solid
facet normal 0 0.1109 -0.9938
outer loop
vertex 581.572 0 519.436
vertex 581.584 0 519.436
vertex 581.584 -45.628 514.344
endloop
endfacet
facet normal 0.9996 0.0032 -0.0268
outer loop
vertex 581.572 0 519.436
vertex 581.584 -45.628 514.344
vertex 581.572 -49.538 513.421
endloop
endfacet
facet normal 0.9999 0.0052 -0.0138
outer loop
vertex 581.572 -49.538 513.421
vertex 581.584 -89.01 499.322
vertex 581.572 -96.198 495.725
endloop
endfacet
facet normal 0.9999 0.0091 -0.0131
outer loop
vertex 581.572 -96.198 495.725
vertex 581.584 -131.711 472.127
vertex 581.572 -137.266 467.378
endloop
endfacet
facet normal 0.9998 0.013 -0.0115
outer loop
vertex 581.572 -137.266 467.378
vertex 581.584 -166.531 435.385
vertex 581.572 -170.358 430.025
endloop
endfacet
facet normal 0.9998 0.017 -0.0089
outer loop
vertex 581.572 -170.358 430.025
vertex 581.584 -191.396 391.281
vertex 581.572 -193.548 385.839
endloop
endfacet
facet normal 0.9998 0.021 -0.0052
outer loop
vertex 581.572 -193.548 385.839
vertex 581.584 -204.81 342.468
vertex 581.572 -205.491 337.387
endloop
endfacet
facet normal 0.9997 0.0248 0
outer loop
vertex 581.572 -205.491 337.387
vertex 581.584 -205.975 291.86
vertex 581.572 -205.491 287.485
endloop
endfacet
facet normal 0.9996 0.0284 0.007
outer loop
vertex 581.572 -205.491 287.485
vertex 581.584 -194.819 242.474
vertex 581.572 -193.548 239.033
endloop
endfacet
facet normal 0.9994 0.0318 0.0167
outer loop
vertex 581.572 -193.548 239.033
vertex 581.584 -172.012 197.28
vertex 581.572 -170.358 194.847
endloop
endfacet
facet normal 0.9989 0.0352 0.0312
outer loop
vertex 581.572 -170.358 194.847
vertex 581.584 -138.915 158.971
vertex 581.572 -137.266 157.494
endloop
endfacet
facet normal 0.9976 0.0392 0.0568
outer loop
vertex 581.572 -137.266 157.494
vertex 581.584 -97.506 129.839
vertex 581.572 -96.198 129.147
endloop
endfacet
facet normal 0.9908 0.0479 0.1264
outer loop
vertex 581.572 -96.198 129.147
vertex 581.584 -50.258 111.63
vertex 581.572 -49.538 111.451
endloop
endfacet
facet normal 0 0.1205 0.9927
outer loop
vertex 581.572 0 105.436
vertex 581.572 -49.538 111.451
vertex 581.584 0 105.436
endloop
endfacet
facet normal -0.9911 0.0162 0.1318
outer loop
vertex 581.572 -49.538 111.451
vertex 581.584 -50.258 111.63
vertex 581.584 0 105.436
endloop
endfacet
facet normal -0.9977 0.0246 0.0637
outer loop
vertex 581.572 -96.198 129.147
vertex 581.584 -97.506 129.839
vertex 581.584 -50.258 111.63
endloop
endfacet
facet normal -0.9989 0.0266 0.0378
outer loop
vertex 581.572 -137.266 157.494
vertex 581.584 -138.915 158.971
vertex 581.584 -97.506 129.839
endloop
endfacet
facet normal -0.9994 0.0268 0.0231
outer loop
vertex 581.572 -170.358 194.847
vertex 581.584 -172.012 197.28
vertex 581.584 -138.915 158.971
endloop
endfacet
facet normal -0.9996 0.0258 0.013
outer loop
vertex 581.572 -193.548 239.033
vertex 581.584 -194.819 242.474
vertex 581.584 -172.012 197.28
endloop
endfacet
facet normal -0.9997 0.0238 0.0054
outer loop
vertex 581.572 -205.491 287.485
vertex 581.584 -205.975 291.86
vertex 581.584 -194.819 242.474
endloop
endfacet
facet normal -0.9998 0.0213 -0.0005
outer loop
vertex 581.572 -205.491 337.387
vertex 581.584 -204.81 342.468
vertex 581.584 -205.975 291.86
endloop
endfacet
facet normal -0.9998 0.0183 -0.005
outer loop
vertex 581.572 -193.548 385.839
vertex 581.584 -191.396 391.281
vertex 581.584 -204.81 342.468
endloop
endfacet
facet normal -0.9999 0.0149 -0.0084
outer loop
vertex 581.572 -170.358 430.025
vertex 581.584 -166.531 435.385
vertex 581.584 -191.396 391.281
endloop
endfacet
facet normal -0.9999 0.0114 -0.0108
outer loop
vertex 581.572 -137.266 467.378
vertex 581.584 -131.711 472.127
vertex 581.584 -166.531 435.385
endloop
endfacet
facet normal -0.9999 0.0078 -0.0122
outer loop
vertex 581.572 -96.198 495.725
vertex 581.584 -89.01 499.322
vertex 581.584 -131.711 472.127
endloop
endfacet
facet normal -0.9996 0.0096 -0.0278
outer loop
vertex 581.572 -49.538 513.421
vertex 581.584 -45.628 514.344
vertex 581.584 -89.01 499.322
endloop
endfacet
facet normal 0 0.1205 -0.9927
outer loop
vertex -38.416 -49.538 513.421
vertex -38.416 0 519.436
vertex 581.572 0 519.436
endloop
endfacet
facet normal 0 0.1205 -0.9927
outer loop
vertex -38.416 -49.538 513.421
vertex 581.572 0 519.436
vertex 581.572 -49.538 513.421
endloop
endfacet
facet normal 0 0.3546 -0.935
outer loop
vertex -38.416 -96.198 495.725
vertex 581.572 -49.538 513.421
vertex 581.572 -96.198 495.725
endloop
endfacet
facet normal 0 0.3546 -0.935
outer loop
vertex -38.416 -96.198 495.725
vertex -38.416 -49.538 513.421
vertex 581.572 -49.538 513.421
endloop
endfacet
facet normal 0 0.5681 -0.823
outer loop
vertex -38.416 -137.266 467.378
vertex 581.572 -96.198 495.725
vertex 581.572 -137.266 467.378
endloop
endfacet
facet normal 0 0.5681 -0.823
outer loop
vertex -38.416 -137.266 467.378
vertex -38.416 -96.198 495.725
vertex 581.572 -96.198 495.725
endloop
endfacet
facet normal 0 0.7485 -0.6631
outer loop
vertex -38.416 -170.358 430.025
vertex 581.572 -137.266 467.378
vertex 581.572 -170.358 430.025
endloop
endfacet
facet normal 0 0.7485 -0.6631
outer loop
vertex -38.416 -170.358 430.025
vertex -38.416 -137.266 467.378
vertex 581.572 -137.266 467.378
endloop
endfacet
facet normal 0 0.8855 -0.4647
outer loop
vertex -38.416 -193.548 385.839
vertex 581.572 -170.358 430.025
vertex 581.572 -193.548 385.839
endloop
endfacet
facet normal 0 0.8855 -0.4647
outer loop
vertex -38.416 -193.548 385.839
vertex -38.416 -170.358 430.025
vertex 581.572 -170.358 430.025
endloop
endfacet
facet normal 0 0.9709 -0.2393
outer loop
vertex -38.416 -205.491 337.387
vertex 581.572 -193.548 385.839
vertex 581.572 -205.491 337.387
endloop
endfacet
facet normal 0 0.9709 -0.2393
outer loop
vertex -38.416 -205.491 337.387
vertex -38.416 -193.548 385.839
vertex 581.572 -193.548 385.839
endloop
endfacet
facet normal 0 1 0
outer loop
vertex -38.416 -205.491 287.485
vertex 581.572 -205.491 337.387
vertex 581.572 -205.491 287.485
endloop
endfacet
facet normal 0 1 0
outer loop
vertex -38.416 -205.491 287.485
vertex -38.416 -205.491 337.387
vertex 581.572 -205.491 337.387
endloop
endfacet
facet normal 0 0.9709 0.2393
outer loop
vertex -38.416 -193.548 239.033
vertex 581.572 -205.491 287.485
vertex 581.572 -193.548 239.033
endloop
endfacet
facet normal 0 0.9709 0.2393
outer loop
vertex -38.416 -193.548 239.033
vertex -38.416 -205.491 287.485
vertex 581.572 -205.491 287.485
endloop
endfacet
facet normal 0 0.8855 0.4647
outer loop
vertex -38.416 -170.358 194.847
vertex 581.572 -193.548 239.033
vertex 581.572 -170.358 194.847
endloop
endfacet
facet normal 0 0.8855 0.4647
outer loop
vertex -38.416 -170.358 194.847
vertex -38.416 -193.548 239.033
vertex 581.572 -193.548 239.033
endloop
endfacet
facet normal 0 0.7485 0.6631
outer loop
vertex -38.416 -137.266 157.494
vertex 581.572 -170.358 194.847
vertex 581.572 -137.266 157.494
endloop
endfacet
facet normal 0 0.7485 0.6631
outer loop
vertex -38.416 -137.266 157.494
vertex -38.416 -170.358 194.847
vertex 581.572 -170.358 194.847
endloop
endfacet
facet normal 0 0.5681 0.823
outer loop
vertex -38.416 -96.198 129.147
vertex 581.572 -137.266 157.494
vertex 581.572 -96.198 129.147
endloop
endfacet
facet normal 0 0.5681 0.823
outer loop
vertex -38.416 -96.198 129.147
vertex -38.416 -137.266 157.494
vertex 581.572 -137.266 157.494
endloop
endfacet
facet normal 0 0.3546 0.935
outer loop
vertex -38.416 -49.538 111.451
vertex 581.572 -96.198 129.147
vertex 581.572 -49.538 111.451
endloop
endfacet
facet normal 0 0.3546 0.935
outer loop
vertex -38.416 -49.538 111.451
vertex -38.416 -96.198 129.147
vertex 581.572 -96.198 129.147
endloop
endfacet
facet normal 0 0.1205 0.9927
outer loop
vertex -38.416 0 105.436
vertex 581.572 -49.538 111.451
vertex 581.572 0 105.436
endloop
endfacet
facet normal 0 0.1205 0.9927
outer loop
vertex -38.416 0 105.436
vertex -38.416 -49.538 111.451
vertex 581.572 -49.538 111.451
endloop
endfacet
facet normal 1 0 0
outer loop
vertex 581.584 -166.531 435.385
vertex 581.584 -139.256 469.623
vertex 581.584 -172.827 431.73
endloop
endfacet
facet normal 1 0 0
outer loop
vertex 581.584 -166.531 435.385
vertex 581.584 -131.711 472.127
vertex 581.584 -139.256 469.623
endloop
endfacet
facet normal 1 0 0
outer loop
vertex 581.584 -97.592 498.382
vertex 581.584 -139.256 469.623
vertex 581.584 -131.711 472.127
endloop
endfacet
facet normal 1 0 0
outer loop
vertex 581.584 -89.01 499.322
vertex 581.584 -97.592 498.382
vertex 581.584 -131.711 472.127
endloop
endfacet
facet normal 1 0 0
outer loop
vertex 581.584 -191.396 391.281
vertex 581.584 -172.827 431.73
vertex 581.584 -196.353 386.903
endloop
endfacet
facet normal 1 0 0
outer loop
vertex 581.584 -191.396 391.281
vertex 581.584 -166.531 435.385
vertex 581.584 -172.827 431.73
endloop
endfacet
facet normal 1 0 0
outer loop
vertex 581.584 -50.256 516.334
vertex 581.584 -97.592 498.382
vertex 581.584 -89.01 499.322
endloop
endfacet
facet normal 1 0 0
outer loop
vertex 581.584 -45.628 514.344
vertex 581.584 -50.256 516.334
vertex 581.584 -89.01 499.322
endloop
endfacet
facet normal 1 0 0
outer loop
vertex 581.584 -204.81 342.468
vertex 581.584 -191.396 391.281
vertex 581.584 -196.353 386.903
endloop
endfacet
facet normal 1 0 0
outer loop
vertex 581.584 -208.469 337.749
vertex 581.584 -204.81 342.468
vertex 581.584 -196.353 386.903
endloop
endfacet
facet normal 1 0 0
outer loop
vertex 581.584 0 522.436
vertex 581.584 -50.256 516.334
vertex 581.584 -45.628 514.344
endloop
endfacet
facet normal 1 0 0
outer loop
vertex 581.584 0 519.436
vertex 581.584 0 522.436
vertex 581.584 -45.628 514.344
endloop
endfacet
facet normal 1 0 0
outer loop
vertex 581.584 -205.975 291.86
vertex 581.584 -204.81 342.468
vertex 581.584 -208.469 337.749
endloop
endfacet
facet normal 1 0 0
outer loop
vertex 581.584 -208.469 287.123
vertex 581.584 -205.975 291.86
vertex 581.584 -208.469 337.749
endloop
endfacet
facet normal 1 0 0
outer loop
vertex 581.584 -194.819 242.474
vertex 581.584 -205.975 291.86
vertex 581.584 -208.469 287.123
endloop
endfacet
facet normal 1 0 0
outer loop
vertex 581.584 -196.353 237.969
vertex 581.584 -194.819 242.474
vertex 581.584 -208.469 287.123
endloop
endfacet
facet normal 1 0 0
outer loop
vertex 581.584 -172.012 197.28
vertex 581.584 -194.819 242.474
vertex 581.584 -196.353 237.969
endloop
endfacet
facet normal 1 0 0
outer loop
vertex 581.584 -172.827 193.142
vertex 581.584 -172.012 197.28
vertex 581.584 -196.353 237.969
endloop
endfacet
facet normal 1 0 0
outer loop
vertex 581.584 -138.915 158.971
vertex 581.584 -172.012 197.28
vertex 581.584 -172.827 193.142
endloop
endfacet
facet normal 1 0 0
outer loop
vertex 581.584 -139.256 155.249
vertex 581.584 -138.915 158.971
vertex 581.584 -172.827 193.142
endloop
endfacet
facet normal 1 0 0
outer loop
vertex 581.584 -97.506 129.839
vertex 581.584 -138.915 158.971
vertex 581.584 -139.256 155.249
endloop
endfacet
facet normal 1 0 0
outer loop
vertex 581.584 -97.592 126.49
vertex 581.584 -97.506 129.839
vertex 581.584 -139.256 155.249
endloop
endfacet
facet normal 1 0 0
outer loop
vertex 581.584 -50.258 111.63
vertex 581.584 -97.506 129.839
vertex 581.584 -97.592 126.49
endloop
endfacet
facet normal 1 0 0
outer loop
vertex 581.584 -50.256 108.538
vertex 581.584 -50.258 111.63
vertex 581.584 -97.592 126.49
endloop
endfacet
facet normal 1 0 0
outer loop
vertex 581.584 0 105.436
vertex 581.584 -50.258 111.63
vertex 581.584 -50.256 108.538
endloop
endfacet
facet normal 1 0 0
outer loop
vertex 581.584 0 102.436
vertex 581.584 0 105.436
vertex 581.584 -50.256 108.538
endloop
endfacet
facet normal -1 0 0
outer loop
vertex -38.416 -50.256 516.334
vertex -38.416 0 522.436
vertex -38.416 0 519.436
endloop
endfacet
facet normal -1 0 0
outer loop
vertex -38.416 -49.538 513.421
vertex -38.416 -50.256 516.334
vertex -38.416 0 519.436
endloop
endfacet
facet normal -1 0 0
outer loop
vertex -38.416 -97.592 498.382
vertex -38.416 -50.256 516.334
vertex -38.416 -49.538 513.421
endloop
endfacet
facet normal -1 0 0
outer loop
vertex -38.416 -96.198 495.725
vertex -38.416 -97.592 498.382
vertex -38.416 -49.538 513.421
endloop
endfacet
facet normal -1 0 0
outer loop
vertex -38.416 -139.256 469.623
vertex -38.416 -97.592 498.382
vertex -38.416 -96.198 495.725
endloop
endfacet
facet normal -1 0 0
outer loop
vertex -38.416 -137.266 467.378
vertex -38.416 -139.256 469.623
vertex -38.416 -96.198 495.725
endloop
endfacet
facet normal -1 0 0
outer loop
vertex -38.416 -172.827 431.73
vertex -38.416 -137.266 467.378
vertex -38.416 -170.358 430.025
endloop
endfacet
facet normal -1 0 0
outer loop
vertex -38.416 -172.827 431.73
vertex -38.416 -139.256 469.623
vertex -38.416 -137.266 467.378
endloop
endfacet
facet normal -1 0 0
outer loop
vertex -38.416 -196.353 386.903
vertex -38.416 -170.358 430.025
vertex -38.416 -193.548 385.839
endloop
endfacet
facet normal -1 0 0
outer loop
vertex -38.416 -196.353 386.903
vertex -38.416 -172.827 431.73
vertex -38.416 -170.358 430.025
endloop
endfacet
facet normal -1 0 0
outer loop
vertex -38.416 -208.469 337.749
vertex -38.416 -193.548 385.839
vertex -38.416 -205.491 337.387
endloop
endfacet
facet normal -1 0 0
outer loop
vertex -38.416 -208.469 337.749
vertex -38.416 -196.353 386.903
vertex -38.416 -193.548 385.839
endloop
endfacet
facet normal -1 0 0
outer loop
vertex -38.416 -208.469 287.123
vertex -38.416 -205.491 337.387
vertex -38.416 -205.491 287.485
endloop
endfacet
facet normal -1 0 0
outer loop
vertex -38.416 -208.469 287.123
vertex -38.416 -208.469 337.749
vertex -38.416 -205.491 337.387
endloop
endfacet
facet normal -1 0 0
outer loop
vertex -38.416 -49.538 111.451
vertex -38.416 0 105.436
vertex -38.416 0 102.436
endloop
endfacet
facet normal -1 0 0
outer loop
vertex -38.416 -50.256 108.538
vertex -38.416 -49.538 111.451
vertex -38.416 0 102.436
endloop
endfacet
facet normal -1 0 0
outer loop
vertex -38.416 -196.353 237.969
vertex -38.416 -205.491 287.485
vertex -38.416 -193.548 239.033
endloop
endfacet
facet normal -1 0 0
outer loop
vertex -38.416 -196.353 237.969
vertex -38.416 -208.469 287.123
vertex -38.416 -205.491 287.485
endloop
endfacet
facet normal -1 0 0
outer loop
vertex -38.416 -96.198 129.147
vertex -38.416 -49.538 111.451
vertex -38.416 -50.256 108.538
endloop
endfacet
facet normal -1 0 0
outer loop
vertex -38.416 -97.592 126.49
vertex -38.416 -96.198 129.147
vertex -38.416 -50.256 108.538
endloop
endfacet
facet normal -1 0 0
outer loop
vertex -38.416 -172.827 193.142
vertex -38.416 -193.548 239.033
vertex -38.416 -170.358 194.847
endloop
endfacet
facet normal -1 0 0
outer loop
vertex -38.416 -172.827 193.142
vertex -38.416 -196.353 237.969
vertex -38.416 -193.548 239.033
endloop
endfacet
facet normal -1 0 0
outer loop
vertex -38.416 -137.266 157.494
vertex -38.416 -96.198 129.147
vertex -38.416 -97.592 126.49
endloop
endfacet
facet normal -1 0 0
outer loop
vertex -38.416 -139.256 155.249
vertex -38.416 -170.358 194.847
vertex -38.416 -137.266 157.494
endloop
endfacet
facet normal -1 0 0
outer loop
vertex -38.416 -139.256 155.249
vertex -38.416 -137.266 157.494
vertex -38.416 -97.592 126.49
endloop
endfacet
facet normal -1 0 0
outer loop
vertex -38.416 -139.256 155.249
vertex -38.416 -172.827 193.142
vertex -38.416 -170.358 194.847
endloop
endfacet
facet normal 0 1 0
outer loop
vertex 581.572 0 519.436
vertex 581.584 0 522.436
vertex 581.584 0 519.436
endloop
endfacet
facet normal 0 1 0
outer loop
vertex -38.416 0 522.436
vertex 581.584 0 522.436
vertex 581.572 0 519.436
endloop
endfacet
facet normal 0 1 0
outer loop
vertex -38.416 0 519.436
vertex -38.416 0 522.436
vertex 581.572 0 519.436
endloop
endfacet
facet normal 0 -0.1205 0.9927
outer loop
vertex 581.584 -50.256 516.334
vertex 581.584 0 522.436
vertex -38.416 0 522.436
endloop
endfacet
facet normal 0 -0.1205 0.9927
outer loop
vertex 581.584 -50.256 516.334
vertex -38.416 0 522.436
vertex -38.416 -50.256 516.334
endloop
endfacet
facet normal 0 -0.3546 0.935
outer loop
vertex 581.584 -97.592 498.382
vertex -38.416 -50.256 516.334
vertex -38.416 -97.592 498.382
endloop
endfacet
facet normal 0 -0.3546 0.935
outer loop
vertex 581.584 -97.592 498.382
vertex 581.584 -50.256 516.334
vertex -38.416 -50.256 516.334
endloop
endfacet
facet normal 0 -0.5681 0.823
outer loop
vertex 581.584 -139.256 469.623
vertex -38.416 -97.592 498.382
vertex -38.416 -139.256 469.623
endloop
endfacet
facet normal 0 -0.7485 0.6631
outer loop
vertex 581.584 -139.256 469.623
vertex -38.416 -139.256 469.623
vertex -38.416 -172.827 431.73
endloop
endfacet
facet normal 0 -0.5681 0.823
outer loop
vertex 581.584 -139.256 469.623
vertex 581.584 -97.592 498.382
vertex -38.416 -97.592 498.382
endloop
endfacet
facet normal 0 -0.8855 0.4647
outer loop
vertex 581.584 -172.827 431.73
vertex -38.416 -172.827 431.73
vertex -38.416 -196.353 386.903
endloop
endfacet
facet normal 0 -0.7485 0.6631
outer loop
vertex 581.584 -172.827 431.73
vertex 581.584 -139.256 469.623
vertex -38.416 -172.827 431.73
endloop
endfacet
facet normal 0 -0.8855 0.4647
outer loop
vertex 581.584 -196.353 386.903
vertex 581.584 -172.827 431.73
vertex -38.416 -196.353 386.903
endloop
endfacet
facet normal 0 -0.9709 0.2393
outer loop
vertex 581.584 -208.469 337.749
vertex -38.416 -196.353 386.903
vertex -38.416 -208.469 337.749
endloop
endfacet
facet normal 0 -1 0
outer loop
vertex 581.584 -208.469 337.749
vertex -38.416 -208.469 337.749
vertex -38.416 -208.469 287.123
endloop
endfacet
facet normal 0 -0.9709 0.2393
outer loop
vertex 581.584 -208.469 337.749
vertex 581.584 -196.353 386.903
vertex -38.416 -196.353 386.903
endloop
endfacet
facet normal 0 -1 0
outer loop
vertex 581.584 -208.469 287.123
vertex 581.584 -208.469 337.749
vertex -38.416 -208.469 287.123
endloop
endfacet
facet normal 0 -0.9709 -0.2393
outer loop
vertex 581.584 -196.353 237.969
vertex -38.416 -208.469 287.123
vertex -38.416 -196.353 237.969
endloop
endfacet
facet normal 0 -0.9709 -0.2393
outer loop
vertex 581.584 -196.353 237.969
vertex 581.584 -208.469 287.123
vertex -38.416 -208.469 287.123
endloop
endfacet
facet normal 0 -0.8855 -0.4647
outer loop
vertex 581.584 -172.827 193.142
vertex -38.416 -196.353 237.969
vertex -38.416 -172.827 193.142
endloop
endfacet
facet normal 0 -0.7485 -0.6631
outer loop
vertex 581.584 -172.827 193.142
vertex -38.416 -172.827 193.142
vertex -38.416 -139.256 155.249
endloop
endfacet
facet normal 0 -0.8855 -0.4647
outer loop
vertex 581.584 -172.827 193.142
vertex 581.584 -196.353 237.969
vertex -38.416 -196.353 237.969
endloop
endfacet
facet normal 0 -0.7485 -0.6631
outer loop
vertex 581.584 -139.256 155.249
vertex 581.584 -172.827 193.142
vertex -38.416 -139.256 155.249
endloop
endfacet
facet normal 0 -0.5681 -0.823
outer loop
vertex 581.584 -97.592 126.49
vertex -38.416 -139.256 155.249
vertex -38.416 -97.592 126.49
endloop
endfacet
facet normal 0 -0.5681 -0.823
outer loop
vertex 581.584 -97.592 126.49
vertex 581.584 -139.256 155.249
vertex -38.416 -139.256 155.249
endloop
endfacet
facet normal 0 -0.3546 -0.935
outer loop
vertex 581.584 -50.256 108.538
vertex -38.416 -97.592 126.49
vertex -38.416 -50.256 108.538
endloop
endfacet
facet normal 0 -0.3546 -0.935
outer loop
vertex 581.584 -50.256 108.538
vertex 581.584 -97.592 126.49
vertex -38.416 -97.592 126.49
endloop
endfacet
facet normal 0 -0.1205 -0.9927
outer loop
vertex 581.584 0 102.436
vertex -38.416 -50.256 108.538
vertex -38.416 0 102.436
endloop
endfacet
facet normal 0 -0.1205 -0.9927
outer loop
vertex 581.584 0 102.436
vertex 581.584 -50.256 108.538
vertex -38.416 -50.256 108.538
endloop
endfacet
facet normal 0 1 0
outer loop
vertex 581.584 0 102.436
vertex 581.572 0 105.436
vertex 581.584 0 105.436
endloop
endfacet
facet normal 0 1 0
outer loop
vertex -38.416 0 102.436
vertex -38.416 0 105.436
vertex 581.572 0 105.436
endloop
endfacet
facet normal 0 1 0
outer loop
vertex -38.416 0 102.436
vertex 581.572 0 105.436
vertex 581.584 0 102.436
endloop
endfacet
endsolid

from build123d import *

# Parameters (mm, degrees)
SKETCH4_W          = 958.607886296
SKETCH4_H          = 357.948466727
CUT_EXTRUDE2_DEPTH = 620
SKETCH5_W          = 348.415387901
SKETCH5_H          = 679.160017281
SKETCH5_W_2        = 379.676333146
SKETCH5_H_2        = 859.178335114
CUT_EXTRUDE3_DEPTH = 500


with BuildPart() as part:
    # Sketch1 → Revolve1 (revolve)
    with BuildSketch(Plane(origin=(0, 0, 0), x_dir=(1, 0, 0), z_dir=(0, 1, 0)), mode=Mode.PRIVATE) as revolve1_sk:
        with BuildLine():
            Line((-38.416122965, -102.435963202), (581.583877035, -102.435963202))
            add(Edge.make_bspline(
                [(581.583877035, -102.435963202), (693.455539681, -103.300064727), (691.583877035, -210.80239754), (691.583877035, -232.435963192)],
                knots=[0, 0, 0, 0, 1, 1, 1, 1], degree=3))
            Line((691.583877035, -232.435963192), (688.583877035, -232.435963192))
            add(Edge.make_bspline(
                [(581.572240946, -105.435963202), (582.424150652, -105.442600659), (584.137918536, -105.468851395), (587.484086921, -105.571526796), (591.571096113, -105.792916991), (596.307608869, -106.20262694), (602.409126826, -106.934758126), (609.639419087, -108.18665603), (617.705857071, -110.190510236), (625.186745256, -112.659295822), (634.414245375, -116.523312816), (644.612073728, -122.339029978), (654.913796392, -130.630357057), (663.469285855, -139.982021209), (670.450391217, -150.141502012), (676.016737994, -160.847618745), (680.323342136, -171.829037867), (683.525745861, -182.806951112), (685.782094183, -193.498408861), (687.253383878, -203.618874424), (687.961369137, -211.339785332), (688.299442483, -216.947462036), (688.459593049, -220.834002423), (688.547117141, -224.365875375), (688.582824389, -227.512914091), (688.58674237, -229.777140481), (688.584795317, -231.383827189), (688.583877035, -232.075985649), (688.583877035, -232.435963192)],
                knots=[3.4973e-05, 3.4973e-05, 3.4973e-05, 3.4973e-05, 0.0078472, 0.015659426, 0.03128388, 0.046908334, 0.062532787, 0.093781694, 0.125030601, 0.156279508, 0.187528415, 0.25002623, 0.312524044, 0.375021858, 0.437519672, 0.500017486, 0.562515301, 0.625013115, 0.687510929, 0.750008743, 0.812506557, 0.843755465, 0.875004372, 0.906253279, 0.937502186, 0.968751093, 0.984375546, 1, 1, 1, 1], degree=3))
            Line((581.572240946, -105.435963202), (-38.416122951, -105.435969803))
            add(Edge.make_bspline(
                [(-145.416150087, -297.448719694), (-145.415786094, -297.363118797), (-145.414261278, -297.209117302), (-145.406482156, -296.763589127), (-145.387577621, -296.059017238), (-145.348080967, -294.963719442), (-145.270536885, -293.196191663), (-145.12221169, -290.430217628), (-144.846888777, -286.292241124), (-144.459106758, -281.402026013), (-143.771963774, -273.967299792), (-142.556325425, -263.124157442), (-140.406308296, -248.159348272), (-137.445210779, -231.767940973), (-133.55430361, -214.477141353), (-128.616651259, -196.81526366), (-122.518262583, -179.311948455), (-115.149922932, -162.497881736), (-106.409989847, -146.903194531), (-96.207058742, -133.05233616), (-86.417989624, -123.386032183), (-77.769632288, -117.014146282), (-70.859172034, -112.970513688), (-63.504748075, -109.716446776), (-56.985343251, -107.708604585), (-51.52041341, -106.554160283), (-47.294097057, -105.922162765), (-43.659473987, -105.597170774), (-40.689467236, -105.462466746), (-39.171234927, -105.437583269), (-38.416122951, -105.435969803)],
                knots=[2.115e-05, 2.115e-05, 2.115e-05, 2.115e-05, 0.007833485, 0.015645819, 0.031270489, 0.046895159, 0.062519828, 0.093769167, 0.125018506, 0.156267845, 0.187517184, 0.250015862, 0.312514541, 0.375013219, 0.437511897, 0.500010575, 0.562509253, 0.625007931, 0.687506609, 0.750005287, 0.812503966, 0.843753305, 0.875002644, 0.906251983, 0.937501322, 0.953125991, 0.968750661, 0.98437533, 0.992187665, 1, 1, 1, 1], degree=3))
            Line((-145.416150087, -297.448719694), (-148.416122965, -297.435963202))
            add(Edge.make_bspline(
                [(-38.416122965, -102.435963202), (-139.444928363, -102.64405425), (-148.369931417, -286.57299354), (-148.416122965, -297.435963202)],
                knots=[0, 0, 0, 0, 1, 1, 1, 1], degree=3))
        make_face()
    revolve(revolve1_sk.sketch.rotate(Axis((-396.592099756, 0, 312.435963202), (1, 0, 0)), 180), axis=Axis((-396.592099756, 0, 312.435963202), (1, 0, 0)))

    # Sketch4 → Cut-Extrude2 (cut)
    with BuildSketch(Plane(origin=(-38.416122965, 0, 0), x_dir=(0, 0, -1), z_dir=(1, 0, 0))):
        with Locations((-258.191988159, 178.974233364)):
            Rectangle(SKETCH4_W, SKETCH4_H)
    extrude(amount=CUT_EXTRUDE2_DEPTH, mode=Mode.SUBTRACT)

    # Sketch5 → Cut-Extrude3 (cut, symmetric)
    with BuildSketch(Plane(origin=(0, 0, 0), x_dir=(1, 0, 0), z_dir=(0, 1, 0))):
        with Locations((-212.623816916, -235.263662883)):
            Rectangle(SKETCH5_W, SKETCH5_H)
        with Locations((771.422043608, -306.861857476)):
            Rectangle(SKETCH5_W_2, SKETCH5_H_2)
    extrude(amount=CUT_EXTRUDE3_DEPTH, both=True, mode=Mode.SUBTRACT)


solid = part.part
